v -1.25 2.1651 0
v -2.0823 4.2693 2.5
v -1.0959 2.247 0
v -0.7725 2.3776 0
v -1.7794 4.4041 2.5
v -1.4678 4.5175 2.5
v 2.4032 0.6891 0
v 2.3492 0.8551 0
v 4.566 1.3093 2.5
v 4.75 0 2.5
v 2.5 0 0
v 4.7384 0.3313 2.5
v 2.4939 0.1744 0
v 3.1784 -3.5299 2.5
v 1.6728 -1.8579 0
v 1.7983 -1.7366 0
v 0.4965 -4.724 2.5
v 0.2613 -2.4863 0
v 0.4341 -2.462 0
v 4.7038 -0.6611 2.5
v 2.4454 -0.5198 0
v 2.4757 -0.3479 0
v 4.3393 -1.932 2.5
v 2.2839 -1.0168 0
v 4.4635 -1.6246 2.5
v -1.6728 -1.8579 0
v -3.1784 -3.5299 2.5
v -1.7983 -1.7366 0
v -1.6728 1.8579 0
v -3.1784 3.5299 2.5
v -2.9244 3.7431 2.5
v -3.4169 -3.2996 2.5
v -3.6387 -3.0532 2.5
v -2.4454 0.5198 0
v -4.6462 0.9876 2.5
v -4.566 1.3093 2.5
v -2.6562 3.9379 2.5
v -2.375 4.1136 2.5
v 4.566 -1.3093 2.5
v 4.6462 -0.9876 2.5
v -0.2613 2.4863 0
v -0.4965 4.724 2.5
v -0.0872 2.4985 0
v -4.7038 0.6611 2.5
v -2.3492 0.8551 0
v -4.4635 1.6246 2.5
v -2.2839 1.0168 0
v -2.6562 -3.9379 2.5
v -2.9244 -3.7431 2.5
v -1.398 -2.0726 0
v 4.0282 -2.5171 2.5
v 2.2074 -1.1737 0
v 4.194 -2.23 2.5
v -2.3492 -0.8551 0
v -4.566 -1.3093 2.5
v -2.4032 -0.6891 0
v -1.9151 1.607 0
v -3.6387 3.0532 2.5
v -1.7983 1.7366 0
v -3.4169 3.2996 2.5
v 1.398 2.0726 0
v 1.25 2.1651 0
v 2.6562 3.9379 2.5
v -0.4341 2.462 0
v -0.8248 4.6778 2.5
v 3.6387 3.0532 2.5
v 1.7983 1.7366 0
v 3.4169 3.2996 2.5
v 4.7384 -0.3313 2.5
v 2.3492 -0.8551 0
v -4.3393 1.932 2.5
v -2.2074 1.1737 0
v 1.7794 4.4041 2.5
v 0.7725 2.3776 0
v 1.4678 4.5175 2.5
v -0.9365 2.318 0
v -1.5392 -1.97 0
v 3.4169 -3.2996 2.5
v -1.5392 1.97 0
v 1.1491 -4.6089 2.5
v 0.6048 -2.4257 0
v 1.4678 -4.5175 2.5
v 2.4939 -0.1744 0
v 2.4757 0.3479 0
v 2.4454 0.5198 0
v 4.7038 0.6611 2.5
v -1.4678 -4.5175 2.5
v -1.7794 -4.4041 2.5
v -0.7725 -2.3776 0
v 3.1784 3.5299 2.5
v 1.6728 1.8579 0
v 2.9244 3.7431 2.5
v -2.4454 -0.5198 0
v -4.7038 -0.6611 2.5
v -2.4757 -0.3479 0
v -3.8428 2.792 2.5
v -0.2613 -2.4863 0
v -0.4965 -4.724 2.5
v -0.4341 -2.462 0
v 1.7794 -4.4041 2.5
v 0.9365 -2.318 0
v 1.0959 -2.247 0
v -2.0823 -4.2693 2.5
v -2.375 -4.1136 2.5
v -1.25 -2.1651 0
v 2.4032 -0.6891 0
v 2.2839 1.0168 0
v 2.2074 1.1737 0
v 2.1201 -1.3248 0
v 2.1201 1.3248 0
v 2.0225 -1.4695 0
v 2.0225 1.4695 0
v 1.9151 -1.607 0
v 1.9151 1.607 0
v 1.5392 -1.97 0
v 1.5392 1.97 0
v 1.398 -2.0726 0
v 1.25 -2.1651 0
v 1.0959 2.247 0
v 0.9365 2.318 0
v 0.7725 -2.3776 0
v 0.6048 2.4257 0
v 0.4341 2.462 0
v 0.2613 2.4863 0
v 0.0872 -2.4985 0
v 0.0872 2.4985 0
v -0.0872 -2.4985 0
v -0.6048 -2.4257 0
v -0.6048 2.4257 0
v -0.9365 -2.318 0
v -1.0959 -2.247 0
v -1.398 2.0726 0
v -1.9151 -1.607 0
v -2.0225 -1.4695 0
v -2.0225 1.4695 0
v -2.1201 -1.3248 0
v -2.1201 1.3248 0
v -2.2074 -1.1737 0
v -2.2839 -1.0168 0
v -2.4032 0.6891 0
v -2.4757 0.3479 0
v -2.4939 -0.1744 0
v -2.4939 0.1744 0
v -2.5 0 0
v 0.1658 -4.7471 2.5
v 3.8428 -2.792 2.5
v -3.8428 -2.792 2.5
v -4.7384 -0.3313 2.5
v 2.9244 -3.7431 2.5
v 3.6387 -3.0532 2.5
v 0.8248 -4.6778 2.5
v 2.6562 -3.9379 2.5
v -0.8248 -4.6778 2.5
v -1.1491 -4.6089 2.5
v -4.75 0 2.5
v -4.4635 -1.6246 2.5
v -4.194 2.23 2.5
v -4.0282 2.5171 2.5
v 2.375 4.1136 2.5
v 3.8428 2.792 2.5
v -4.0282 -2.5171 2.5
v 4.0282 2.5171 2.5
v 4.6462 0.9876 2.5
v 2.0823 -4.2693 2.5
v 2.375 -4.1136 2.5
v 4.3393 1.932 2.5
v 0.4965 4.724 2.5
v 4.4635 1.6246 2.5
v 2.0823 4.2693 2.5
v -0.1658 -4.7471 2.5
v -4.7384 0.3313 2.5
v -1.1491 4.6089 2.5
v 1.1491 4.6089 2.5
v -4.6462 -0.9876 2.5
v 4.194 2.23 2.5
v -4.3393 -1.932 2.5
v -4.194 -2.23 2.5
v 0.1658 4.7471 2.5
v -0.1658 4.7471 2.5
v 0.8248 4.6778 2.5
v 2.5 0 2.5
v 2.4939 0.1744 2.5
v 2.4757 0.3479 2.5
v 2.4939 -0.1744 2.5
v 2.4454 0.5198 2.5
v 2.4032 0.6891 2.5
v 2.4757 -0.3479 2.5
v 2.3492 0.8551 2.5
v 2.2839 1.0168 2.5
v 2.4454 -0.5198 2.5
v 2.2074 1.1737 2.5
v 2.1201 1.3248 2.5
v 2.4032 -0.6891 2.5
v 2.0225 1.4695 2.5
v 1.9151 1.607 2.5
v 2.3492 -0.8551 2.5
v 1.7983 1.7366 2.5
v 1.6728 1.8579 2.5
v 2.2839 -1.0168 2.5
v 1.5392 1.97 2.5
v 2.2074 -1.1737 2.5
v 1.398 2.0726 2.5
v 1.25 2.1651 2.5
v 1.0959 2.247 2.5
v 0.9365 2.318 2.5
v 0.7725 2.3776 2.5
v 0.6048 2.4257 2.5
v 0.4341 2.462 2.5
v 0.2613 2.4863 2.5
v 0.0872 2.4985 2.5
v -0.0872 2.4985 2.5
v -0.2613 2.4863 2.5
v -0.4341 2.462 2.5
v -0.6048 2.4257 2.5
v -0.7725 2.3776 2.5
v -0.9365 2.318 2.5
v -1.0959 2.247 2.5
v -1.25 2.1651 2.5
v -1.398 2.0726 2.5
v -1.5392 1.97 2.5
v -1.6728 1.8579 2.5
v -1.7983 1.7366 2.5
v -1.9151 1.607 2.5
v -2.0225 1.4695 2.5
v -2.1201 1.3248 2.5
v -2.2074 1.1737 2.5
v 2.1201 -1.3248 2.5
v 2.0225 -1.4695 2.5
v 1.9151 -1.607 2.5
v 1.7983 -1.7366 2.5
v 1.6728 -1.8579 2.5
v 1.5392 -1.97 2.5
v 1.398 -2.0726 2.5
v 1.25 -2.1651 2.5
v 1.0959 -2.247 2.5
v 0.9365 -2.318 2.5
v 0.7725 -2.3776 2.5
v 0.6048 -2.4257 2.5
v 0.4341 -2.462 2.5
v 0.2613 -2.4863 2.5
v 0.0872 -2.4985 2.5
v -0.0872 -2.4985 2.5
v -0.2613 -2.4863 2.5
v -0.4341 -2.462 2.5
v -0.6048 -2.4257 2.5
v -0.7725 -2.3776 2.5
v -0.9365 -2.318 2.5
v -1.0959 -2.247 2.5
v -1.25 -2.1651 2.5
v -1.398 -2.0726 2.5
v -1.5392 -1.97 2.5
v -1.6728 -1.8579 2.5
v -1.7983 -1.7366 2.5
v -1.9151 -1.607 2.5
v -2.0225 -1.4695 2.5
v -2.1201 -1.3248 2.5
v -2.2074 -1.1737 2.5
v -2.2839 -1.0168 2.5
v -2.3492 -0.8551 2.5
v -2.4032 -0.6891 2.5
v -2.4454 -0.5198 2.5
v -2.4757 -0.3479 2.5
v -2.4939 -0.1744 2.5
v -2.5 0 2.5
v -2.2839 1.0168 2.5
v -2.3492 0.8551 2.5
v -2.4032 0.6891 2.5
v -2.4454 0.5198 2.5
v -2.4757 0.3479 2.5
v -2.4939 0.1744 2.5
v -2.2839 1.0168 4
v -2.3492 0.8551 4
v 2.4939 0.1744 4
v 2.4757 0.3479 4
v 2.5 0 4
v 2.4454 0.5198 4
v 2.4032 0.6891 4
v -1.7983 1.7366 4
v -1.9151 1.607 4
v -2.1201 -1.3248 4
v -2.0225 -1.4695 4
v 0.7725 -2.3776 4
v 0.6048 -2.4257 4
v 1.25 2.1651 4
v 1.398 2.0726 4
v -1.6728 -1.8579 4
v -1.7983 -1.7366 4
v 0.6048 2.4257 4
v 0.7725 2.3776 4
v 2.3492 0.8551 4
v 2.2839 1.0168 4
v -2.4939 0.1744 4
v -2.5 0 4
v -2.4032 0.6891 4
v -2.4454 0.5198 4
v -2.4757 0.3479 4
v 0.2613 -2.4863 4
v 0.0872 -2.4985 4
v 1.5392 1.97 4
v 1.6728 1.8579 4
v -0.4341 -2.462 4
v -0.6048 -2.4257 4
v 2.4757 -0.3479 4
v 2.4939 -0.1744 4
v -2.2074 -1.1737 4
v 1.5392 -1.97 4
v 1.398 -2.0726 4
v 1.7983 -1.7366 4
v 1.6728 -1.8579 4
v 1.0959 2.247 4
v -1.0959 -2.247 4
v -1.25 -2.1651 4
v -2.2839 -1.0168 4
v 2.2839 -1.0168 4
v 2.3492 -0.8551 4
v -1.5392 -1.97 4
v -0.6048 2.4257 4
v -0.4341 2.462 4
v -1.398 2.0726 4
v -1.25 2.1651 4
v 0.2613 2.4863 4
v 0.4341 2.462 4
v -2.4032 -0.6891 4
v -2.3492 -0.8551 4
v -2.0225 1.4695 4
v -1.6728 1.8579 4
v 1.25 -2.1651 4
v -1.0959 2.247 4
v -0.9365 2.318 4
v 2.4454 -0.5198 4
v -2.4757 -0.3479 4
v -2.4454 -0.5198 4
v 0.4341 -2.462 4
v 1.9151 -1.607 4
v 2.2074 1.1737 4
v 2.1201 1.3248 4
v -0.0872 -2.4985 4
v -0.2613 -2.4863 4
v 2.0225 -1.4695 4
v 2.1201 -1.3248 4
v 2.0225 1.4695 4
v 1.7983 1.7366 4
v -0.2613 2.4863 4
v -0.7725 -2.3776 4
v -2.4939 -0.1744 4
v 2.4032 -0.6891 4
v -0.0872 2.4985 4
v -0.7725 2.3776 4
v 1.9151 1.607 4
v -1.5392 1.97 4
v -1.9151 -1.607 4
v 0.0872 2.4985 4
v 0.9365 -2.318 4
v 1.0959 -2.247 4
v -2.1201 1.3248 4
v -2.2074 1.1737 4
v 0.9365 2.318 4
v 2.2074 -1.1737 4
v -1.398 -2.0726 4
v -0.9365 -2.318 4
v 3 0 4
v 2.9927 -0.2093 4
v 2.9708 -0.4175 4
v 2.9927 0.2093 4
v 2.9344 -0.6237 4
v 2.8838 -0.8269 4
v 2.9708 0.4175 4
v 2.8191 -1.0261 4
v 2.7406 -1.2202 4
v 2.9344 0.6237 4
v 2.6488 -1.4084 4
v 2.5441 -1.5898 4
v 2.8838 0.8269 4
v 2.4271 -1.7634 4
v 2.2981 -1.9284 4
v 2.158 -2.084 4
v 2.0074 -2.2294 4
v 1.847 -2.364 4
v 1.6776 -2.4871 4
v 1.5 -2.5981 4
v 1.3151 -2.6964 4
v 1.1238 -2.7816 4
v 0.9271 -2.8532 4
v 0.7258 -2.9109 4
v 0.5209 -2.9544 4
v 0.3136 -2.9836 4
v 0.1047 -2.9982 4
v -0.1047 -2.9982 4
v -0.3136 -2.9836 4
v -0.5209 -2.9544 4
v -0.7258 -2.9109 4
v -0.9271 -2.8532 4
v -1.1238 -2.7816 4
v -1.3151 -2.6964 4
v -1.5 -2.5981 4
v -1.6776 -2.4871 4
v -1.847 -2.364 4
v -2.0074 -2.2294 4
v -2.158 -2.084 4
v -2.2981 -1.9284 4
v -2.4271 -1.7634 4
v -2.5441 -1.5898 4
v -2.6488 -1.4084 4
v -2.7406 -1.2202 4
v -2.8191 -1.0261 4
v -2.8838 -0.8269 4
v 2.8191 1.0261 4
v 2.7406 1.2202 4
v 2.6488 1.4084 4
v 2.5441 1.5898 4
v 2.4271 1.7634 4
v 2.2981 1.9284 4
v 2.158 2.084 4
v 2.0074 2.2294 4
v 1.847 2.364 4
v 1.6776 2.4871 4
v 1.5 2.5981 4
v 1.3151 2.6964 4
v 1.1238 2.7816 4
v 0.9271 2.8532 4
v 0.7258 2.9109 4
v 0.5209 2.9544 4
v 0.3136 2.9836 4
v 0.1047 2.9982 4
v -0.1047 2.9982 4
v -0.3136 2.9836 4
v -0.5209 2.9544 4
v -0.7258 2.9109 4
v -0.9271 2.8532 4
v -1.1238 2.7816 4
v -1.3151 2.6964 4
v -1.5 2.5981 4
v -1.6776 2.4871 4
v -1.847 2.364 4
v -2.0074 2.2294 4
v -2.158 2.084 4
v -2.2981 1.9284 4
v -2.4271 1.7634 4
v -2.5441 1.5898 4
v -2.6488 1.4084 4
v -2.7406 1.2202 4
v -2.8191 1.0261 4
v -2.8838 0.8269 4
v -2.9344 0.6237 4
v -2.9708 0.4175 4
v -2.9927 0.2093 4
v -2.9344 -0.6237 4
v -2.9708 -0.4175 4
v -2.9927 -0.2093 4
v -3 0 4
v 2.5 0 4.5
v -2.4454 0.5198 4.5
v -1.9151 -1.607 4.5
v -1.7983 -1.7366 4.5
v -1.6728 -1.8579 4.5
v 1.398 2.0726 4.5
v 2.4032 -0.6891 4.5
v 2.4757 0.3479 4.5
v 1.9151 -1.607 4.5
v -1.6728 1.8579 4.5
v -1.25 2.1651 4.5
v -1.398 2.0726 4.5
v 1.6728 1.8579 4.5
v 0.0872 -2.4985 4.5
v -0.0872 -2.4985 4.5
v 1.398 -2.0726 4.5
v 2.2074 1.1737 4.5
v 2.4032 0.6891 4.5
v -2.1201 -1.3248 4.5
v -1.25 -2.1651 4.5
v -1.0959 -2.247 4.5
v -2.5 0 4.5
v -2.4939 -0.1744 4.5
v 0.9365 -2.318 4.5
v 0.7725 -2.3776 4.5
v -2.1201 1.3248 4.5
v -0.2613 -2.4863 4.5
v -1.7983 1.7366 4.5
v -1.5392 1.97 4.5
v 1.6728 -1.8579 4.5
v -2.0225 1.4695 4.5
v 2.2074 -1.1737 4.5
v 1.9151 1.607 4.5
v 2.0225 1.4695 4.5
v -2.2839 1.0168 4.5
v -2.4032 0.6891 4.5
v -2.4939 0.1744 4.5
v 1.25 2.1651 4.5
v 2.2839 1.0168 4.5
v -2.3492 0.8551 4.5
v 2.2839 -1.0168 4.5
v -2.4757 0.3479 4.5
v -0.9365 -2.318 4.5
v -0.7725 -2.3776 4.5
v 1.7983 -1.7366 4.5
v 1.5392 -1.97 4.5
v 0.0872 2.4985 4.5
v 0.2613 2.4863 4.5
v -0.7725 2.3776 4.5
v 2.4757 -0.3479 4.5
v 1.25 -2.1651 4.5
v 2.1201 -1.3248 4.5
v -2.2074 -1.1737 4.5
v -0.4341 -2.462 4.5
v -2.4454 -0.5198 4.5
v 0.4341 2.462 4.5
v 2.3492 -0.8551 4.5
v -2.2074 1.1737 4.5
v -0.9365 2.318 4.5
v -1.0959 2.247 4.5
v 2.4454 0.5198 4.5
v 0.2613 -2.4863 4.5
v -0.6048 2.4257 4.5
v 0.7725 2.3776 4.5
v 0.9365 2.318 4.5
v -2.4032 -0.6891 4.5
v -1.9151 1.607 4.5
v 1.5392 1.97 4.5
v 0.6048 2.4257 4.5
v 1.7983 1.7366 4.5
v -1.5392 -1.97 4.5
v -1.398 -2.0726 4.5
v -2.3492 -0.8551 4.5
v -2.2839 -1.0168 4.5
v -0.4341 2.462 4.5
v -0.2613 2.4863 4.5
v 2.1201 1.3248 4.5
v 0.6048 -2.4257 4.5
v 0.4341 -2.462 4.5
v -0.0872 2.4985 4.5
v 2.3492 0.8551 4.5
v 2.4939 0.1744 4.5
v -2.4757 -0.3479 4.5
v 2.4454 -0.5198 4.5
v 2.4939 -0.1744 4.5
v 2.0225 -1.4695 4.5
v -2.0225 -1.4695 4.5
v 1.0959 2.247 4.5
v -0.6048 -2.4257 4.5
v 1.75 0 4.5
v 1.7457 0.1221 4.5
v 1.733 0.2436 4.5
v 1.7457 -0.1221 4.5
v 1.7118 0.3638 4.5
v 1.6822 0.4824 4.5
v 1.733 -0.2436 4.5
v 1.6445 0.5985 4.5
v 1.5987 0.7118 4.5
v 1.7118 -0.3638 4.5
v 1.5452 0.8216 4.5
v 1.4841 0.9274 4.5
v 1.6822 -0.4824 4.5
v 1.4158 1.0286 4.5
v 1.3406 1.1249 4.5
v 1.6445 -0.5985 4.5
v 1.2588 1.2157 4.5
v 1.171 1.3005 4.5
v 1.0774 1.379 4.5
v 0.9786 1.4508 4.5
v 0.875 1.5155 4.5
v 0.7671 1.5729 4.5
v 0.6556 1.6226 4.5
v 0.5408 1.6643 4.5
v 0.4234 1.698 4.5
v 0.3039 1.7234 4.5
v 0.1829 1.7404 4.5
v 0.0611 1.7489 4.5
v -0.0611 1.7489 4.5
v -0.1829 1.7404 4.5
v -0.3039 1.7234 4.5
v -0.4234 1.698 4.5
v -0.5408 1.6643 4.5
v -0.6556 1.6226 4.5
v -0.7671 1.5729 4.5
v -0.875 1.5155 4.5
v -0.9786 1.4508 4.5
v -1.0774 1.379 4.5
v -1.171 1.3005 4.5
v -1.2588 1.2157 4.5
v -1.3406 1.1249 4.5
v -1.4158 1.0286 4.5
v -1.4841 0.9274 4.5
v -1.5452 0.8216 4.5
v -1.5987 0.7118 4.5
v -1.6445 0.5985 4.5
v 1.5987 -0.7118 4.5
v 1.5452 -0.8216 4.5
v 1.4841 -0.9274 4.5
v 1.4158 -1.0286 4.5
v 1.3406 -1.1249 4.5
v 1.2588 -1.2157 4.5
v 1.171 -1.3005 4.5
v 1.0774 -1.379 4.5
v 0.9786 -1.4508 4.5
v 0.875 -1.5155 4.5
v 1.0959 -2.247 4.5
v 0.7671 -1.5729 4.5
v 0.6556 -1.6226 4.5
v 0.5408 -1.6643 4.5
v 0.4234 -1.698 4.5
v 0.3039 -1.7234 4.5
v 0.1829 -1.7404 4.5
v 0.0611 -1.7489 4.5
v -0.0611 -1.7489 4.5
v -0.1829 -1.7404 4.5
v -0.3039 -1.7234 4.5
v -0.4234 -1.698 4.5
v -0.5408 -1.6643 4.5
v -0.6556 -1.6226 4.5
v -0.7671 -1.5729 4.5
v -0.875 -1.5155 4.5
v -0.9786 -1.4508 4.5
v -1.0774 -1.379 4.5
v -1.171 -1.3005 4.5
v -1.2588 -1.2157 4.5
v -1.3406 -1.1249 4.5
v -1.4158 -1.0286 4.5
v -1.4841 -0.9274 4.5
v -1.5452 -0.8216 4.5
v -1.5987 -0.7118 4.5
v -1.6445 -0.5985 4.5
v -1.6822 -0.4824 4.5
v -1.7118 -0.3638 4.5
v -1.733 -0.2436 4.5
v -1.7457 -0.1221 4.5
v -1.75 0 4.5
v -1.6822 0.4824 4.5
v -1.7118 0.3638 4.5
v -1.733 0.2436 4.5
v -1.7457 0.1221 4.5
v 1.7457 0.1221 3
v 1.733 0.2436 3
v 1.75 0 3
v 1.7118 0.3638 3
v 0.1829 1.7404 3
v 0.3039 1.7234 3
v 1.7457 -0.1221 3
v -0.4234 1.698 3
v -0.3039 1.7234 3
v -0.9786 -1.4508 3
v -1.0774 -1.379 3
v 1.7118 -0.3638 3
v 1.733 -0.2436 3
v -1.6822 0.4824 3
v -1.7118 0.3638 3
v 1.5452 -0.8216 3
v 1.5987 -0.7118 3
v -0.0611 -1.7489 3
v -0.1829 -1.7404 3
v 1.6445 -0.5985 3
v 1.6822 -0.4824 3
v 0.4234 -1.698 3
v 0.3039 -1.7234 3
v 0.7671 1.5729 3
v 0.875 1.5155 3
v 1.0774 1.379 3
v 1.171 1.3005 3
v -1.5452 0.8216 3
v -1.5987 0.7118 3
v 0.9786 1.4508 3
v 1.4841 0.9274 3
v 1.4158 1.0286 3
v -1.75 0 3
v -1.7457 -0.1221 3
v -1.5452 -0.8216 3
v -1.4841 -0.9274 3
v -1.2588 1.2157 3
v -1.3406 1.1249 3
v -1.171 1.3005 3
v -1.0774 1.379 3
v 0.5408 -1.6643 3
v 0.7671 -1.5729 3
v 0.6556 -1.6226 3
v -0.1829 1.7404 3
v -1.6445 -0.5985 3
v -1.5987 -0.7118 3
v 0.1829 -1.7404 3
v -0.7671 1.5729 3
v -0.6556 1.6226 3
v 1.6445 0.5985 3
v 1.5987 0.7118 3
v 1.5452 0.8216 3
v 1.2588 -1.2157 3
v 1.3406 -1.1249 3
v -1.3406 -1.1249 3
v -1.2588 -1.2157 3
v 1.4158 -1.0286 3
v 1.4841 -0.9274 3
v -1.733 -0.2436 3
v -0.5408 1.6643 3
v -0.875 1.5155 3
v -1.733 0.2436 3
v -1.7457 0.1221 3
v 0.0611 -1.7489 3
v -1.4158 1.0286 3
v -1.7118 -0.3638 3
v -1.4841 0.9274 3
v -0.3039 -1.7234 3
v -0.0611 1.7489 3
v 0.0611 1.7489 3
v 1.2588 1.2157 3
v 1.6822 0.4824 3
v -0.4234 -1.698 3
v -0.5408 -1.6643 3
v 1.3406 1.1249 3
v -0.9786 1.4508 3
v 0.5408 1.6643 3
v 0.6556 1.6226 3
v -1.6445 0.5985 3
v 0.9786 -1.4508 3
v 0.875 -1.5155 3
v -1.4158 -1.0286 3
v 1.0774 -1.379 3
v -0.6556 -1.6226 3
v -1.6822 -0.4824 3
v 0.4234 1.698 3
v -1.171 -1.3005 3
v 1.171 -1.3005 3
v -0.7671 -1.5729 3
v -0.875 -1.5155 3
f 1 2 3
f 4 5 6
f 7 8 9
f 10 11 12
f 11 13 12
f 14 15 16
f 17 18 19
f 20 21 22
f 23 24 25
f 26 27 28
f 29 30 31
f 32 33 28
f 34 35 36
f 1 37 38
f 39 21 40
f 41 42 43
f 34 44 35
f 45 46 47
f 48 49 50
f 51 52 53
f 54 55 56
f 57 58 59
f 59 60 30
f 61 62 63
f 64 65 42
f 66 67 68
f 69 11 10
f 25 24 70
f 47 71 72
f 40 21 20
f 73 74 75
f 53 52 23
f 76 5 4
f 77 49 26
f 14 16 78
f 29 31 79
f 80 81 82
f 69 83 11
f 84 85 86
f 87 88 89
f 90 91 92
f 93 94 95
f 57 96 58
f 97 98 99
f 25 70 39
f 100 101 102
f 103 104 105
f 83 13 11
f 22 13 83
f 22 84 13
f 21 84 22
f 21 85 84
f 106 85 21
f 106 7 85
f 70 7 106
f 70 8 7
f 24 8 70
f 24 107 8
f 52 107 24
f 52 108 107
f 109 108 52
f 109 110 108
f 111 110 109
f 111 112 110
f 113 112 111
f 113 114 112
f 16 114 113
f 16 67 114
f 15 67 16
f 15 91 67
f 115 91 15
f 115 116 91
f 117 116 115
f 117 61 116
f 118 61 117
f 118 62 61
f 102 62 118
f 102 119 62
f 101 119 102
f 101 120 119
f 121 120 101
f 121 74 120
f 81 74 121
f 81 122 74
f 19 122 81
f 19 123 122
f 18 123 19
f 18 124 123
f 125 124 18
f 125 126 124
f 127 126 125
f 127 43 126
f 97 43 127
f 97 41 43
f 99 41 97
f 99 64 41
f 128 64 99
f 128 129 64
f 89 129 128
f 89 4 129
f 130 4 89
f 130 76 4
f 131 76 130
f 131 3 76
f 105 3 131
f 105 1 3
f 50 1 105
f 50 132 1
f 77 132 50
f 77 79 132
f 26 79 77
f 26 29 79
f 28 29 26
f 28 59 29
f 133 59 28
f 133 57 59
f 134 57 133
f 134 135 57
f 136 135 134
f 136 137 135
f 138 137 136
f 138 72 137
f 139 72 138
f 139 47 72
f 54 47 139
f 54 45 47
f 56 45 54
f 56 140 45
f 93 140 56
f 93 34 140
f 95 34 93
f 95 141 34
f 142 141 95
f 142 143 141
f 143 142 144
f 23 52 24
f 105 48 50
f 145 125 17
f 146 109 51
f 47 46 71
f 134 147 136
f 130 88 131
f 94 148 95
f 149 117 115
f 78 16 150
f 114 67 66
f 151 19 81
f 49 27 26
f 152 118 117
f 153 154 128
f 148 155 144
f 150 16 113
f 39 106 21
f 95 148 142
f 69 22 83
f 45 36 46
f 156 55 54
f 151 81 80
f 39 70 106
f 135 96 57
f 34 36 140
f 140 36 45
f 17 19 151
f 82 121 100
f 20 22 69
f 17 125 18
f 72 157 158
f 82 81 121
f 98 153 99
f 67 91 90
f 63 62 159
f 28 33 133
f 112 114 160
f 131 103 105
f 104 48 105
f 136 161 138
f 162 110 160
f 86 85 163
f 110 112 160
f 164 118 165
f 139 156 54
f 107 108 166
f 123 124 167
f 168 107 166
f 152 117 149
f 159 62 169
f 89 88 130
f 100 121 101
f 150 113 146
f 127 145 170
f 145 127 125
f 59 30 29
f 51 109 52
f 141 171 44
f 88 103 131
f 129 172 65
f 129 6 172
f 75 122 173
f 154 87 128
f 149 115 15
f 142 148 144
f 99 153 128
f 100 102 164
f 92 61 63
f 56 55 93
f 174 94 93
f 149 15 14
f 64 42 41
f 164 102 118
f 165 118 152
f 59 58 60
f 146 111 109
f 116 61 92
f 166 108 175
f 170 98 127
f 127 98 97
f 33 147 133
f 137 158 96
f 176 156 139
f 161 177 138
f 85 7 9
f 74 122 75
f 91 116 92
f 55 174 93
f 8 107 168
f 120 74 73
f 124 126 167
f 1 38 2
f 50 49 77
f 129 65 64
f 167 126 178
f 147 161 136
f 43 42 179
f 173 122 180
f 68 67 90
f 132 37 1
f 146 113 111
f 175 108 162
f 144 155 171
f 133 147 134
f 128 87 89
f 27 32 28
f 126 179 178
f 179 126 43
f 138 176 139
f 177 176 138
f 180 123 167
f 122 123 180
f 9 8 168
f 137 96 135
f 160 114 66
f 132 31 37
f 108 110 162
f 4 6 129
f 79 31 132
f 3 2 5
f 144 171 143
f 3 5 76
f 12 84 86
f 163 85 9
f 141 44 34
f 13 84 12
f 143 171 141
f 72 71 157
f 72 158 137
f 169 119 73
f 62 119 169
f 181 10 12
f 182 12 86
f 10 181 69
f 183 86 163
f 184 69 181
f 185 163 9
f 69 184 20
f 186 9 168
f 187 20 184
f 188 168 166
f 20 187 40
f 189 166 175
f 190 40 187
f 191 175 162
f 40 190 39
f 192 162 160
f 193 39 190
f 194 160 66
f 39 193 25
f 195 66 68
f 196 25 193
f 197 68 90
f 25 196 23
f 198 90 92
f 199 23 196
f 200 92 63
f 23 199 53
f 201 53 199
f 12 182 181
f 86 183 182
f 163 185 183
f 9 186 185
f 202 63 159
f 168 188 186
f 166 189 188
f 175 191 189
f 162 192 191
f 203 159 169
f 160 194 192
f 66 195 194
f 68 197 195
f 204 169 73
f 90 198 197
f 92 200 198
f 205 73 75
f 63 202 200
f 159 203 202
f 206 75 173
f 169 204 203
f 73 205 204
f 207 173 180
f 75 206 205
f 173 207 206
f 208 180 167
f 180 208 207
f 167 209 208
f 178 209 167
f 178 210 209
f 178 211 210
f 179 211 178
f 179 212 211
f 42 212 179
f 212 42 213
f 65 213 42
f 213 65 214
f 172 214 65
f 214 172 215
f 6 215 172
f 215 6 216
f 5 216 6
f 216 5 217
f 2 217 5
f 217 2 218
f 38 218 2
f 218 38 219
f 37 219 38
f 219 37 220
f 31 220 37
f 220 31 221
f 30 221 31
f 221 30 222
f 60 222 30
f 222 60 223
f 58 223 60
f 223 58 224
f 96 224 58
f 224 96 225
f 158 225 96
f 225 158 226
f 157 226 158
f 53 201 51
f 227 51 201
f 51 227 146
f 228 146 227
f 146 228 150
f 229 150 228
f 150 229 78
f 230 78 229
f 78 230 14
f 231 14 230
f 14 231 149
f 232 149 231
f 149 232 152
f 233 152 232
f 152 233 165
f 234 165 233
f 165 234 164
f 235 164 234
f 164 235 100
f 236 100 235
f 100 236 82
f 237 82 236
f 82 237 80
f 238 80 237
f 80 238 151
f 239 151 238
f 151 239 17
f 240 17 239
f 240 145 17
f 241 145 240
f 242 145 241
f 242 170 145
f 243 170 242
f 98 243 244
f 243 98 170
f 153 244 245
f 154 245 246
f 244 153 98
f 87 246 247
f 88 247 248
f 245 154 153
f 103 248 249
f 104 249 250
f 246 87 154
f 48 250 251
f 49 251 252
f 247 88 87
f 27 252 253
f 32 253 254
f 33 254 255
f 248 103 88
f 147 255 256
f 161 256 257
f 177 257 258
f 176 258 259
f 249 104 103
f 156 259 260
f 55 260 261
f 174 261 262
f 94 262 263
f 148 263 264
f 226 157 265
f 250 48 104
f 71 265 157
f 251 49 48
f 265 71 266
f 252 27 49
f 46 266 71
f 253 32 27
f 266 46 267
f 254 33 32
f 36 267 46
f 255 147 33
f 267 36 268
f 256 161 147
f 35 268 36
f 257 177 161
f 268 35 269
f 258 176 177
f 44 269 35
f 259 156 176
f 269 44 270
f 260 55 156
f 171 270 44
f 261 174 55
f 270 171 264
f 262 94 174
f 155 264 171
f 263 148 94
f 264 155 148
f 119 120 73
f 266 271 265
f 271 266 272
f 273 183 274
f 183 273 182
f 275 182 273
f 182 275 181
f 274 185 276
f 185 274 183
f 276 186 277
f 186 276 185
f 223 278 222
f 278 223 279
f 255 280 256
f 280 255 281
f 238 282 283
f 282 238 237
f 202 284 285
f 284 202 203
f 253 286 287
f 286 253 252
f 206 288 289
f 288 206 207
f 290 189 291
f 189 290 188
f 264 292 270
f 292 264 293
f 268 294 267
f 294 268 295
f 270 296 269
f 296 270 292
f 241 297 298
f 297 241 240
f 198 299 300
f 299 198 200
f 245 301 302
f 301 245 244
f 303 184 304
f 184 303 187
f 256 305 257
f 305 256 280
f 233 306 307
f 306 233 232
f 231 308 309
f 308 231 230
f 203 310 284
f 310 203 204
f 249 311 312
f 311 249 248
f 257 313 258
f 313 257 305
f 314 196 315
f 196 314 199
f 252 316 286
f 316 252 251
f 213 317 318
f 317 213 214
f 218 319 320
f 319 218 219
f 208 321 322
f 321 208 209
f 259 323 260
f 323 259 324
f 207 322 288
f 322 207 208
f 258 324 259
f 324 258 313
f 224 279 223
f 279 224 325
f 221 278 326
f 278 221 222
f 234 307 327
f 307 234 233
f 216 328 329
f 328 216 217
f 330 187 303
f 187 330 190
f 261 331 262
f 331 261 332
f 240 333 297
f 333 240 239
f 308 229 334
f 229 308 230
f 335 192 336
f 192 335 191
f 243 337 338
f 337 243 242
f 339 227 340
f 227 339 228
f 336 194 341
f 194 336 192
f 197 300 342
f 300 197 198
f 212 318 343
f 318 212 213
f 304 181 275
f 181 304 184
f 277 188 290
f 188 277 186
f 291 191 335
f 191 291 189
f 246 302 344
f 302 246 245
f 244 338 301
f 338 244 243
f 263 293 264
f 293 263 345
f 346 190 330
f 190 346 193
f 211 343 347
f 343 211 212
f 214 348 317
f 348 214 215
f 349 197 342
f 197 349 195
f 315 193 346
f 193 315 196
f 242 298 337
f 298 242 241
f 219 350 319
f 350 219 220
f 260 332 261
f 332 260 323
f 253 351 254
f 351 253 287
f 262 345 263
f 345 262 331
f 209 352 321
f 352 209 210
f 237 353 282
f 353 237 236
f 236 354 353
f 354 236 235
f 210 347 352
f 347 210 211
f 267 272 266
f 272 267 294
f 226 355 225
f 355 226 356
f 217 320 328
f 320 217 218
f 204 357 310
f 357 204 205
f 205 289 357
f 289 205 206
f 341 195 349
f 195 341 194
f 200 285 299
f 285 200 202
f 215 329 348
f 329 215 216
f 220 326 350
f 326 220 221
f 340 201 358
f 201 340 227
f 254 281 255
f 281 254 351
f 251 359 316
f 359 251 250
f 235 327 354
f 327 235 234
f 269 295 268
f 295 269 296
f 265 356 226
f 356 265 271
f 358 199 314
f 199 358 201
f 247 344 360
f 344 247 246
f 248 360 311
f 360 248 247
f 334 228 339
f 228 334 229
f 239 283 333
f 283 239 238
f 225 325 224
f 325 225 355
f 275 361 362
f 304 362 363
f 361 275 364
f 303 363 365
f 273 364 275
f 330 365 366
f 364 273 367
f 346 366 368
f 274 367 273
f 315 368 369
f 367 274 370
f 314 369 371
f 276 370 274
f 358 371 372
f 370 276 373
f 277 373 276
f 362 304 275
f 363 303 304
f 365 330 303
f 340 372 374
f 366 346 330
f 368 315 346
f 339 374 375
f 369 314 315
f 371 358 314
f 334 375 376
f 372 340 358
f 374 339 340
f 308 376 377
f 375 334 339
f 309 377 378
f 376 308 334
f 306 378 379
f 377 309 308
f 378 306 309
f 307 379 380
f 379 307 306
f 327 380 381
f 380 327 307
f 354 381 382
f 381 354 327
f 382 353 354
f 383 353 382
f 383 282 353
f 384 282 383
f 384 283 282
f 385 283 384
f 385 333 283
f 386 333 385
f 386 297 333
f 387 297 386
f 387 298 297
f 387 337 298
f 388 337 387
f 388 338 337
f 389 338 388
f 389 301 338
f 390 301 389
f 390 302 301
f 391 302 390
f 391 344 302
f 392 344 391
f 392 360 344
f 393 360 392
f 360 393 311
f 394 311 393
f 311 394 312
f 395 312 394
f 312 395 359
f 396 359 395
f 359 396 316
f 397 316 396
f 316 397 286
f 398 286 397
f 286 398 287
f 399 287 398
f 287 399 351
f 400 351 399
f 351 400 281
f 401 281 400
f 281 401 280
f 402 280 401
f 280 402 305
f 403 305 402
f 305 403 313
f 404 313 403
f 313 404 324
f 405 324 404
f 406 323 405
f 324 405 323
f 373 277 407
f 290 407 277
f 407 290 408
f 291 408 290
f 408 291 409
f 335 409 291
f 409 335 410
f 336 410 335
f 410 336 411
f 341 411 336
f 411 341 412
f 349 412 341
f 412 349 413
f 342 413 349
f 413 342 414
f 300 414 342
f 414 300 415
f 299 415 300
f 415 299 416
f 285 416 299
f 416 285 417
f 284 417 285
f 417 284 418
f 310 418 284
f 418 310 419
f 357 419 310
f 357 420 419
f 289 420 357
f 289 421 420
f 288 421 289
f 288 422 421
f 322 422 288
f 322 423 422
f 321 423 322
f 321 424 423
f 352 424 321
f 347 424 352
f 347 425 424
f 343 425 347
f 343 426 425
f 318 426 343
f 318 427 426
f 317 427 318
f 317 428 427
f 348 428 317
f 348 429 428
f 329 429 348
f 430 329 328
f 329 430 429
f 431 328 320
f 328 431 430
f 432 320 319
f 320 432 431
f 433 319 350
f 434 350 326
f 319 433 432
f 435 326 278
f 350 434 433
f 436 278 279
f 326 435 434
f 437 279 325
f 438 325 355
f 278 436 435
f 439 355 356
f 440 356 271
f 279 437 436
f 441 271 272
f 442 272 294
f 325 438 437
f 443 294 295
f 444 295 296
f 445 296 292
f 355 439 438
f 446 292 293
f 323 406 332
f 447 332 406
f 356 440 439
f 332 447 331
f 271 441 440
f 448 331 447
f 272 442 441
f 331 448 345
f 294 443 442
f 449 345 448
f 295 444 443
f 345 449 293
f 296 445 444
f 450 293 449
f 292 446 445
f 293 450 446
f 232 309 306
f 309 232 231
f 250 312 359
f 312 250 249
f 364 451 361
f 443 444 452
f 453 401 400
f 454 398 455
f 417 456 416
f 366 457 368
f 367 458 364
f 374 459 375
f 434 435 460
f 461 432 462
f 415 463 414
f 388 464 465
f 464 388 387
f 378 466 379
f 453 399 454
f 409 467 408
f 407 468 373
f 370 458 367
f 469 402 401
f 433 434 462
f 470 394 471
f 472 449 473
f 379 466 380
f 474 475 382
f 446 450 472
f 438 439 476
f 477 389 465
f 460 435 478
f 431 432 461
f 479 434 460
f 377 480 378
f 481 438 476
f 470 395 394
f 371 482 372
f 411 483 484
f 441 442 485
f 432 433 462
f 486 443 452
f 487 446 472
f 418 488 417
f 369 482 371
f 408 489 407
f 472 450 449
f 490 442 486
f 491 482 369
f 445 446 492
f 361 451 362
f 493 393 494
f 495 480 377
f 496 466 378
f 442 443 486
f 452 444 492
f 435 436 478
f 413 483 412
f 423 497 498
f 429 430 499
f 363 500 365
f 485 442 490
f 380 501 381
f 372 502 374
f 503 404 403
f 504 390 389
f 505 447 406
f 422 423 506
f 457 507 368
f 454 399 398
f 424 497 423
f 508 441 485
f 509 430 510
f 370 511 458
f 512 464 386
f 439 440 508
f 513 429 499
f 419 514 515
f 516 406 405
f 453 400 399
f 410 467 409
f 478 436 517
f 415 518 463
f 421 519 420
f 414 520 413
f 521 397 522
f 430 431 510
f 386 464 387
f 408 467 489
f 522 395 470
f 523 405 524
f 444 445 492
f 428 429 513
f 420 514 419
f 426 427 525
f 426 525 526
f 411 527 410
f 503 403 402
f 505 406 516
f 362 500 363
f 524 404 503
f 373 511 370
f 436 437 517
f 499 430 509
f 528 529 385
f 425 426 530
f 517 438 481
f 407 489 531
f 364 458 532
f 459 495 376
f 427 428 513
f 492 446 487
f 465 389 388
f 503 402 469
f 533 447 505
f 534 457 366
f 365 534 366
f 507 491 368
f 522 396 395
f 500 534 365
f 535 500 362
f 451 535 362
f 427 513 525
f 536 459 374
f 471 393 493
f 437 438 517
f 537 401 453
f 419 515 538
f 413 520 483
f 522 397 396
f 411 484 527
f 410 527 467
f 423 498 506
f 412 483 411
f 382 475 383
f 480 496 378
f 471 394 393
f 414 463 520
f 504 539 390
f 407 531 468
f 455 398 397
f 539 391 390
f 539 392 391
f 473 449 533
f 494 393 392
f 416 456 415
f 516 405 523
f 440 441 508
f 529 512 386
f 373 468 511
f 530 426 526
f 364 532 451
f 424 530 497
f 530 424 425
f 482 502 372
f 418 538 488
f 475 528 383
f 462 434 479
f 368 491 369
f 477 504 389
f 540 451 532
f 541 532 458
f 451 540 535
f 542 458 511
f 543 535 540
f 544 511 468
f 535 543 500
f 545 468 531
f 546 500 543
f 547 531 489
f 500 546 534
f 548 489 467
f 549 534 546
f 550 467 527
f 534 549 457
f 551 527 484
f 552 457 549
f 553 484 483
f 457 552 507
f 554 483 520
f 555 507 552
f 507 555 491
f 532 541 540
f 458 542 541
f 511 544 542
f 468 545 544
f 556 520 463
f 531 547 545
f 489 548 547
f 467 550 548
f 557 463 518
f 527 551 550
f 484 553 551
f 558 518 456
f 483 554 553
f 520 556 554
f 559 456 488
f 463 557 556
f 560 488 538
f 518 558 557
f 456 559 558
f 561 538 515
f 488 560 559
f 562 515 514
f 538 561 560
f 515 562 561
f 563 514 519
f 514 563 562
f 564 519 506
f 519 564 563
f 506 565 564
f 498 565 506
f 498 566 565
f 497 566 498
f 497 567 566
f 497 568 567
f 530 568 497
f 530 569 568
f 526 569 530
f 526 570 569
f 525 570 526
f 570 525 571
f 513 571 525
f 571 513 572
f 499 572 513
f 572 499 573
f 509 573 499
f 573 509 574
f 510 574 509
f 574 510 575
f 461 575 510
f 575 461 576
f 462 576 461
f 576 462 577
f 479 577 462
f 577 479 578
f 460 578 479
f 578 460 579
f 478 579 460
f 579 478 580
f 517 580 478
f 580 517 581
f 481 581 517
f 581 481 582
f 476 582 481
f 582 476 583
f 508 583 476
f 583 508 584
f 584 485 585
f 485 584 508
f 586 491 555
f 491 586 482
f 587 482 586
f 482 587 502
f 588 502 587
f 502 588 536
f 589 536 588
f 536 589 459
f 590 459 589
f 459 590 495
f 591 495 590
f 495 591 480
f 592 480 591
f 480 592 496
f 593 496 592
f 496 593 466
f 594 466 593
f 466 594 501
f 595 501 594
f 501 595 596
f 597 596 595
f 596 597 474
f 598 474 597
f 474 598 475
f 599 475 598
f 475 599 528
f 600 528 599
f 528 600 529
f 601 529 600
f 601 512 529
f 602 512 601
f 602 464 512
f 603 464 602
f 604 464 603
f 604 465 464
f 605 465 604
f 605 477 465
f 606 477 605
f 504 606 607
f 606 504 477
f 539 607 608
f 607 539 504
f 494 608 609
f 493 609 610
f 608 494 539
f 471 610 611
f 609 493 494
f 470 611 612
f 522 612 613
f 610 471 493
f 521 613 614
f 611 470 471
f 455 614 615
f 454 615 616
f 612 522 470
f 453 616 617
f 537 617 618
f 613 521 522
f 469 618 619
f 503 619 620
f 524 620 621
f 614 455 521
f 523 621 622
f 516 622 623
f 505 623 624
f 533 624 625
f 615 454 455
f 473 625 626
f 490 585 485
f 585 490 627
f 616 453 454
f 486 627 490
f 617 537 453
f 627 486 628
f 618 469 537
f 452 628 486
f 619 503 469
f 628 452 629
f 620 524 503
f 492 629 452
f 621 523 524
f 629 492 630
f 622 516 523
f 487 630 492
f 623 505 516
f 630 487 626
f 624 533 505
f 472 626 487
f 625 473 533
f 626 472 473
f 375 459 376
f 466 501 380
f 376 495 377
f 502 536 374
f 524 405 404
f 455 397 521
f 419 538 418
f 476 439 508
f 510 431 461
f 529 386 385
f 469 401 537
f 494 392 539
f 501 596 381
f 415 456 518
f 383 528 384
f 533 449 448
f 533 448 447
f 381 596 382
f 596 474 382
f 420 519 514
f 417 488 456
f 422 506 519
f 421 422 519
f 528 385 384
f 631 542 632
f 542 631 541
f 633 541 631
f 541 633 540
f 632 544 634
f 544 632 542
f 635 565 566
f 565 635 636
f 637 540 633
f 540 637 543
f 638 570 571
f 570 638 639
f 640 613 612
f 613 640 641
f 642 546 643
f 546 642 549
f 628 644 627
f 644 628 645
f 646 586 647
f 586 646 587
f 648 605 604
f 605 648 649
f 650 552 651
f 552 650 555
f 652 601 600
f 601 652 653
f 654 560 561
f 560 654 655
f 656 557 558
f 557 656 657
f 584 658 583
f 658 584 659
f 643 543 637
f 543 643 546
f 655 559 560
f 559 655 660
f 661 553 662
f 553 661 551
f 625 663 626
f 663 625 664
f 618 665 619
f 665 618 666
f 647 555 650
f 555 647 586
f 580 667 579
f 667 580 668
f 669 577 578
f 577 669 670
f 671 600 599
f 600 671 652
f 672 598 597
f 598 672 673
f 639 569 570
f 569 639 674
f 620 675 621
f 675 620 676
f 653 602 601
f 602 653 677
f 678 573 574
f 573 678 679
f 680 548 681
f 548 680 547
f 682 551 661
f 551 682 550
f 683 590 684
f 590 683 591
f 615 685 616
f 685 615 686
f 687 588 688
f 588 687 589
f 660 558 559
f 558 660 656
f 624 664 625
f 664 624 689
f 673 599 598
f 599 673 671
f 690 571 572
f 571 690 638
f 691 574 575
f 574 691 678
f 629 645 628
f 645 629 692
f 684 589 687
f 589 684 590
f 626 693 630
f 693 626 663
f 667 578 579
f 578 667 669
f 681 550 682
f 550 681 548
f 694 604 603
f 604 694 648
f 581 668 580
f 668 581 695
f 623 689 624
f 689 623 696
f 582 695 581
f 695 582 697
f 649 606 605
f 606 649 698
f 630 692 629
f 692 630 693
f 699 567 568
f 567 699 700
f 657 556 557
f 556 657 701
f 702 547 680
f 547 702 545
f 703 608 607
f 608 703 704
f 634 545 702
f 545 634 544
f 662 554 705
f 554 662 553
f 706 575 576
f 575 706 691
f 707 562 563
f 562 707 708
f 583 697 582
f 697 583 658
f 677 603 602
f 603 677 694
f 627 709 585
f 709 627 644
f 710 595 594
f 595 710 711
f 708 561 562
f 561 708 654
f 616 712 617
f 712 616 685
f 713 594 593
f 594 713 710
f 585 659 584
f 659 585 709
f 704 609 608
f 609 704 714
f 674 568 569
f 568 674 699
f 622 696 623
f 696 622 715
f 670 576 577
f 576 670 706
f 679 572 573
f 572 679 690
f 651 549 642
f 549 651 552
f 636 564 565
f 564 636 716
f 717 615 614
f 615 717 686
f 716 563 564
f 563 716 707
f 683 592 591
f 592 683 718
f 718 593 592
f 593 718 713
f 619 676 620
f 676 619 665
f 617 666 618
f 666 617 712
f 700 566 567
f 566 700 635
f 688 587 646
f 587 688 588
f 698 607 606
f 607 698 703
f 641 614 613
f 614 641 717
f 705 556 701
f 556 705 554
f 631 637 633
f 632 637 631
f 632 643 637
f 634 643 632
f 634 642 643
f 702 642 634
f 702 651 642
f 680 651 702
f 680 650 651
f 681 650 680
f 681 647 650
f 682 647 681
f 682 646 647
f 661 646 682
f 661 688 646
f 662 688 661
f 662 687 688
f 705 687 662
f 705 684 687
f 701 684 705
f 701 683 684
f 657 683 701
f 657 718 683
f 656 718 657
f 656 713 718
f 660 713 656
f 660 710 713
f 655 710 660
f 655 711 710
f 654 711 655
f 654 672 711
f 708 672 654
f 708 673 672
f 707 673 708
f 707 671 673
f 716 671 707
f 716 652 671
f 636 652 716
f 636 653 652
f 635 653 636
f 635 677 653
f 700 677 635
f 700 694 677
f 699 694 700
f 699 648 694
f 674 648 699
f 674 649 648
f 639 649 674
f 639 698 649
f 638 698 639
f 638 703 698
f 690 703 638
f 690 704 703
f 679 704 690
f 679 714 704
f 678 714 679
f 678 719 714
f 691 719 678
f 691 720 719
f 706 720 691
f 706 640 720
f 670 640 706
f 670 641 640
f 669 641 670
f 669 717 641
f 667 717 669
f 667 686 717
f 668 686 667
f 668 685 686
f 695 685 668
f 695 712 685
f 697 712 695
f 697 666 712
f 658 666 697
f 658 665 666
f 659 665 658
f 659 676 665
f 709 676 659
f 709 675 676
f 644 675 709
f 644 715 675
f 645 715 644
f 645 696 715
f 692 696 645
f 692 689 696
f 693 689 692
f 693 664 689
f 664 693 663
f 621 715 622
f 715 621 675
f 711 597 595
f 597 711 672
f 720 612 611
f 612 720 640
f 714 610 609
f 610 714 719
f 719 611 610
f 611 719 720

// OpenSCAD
//
//  VentoDroneFoot.scad
//
//  EvilTeach
//
//  04/29/2018
//

$fn=90;

module bottom()
{
    color("white")
        cylinder(d2 = 9.5, d1 = 5.0, h = 2.5);
}

module middle()
{
    color("cyan")
        cylinder(d = 5.0, h = 2.0);
}

module top()
{
    difference()
    {
        color("yellow")
            cylinder(d1 = 6.0, d2 = 5.0, h = 0.5);
        

    }
}


module main()
{
    difference()
    {
        union()
        {
            translate([0, 0, 0])
                bottom();
            
            translate([0, 0, 2])
                middle();
            
            translate([0, 0, 4])
                top();
        }

        translate([0, 0, 3.0])
            cylinder(d = 3.5, h = 4);
    }
}


main();
